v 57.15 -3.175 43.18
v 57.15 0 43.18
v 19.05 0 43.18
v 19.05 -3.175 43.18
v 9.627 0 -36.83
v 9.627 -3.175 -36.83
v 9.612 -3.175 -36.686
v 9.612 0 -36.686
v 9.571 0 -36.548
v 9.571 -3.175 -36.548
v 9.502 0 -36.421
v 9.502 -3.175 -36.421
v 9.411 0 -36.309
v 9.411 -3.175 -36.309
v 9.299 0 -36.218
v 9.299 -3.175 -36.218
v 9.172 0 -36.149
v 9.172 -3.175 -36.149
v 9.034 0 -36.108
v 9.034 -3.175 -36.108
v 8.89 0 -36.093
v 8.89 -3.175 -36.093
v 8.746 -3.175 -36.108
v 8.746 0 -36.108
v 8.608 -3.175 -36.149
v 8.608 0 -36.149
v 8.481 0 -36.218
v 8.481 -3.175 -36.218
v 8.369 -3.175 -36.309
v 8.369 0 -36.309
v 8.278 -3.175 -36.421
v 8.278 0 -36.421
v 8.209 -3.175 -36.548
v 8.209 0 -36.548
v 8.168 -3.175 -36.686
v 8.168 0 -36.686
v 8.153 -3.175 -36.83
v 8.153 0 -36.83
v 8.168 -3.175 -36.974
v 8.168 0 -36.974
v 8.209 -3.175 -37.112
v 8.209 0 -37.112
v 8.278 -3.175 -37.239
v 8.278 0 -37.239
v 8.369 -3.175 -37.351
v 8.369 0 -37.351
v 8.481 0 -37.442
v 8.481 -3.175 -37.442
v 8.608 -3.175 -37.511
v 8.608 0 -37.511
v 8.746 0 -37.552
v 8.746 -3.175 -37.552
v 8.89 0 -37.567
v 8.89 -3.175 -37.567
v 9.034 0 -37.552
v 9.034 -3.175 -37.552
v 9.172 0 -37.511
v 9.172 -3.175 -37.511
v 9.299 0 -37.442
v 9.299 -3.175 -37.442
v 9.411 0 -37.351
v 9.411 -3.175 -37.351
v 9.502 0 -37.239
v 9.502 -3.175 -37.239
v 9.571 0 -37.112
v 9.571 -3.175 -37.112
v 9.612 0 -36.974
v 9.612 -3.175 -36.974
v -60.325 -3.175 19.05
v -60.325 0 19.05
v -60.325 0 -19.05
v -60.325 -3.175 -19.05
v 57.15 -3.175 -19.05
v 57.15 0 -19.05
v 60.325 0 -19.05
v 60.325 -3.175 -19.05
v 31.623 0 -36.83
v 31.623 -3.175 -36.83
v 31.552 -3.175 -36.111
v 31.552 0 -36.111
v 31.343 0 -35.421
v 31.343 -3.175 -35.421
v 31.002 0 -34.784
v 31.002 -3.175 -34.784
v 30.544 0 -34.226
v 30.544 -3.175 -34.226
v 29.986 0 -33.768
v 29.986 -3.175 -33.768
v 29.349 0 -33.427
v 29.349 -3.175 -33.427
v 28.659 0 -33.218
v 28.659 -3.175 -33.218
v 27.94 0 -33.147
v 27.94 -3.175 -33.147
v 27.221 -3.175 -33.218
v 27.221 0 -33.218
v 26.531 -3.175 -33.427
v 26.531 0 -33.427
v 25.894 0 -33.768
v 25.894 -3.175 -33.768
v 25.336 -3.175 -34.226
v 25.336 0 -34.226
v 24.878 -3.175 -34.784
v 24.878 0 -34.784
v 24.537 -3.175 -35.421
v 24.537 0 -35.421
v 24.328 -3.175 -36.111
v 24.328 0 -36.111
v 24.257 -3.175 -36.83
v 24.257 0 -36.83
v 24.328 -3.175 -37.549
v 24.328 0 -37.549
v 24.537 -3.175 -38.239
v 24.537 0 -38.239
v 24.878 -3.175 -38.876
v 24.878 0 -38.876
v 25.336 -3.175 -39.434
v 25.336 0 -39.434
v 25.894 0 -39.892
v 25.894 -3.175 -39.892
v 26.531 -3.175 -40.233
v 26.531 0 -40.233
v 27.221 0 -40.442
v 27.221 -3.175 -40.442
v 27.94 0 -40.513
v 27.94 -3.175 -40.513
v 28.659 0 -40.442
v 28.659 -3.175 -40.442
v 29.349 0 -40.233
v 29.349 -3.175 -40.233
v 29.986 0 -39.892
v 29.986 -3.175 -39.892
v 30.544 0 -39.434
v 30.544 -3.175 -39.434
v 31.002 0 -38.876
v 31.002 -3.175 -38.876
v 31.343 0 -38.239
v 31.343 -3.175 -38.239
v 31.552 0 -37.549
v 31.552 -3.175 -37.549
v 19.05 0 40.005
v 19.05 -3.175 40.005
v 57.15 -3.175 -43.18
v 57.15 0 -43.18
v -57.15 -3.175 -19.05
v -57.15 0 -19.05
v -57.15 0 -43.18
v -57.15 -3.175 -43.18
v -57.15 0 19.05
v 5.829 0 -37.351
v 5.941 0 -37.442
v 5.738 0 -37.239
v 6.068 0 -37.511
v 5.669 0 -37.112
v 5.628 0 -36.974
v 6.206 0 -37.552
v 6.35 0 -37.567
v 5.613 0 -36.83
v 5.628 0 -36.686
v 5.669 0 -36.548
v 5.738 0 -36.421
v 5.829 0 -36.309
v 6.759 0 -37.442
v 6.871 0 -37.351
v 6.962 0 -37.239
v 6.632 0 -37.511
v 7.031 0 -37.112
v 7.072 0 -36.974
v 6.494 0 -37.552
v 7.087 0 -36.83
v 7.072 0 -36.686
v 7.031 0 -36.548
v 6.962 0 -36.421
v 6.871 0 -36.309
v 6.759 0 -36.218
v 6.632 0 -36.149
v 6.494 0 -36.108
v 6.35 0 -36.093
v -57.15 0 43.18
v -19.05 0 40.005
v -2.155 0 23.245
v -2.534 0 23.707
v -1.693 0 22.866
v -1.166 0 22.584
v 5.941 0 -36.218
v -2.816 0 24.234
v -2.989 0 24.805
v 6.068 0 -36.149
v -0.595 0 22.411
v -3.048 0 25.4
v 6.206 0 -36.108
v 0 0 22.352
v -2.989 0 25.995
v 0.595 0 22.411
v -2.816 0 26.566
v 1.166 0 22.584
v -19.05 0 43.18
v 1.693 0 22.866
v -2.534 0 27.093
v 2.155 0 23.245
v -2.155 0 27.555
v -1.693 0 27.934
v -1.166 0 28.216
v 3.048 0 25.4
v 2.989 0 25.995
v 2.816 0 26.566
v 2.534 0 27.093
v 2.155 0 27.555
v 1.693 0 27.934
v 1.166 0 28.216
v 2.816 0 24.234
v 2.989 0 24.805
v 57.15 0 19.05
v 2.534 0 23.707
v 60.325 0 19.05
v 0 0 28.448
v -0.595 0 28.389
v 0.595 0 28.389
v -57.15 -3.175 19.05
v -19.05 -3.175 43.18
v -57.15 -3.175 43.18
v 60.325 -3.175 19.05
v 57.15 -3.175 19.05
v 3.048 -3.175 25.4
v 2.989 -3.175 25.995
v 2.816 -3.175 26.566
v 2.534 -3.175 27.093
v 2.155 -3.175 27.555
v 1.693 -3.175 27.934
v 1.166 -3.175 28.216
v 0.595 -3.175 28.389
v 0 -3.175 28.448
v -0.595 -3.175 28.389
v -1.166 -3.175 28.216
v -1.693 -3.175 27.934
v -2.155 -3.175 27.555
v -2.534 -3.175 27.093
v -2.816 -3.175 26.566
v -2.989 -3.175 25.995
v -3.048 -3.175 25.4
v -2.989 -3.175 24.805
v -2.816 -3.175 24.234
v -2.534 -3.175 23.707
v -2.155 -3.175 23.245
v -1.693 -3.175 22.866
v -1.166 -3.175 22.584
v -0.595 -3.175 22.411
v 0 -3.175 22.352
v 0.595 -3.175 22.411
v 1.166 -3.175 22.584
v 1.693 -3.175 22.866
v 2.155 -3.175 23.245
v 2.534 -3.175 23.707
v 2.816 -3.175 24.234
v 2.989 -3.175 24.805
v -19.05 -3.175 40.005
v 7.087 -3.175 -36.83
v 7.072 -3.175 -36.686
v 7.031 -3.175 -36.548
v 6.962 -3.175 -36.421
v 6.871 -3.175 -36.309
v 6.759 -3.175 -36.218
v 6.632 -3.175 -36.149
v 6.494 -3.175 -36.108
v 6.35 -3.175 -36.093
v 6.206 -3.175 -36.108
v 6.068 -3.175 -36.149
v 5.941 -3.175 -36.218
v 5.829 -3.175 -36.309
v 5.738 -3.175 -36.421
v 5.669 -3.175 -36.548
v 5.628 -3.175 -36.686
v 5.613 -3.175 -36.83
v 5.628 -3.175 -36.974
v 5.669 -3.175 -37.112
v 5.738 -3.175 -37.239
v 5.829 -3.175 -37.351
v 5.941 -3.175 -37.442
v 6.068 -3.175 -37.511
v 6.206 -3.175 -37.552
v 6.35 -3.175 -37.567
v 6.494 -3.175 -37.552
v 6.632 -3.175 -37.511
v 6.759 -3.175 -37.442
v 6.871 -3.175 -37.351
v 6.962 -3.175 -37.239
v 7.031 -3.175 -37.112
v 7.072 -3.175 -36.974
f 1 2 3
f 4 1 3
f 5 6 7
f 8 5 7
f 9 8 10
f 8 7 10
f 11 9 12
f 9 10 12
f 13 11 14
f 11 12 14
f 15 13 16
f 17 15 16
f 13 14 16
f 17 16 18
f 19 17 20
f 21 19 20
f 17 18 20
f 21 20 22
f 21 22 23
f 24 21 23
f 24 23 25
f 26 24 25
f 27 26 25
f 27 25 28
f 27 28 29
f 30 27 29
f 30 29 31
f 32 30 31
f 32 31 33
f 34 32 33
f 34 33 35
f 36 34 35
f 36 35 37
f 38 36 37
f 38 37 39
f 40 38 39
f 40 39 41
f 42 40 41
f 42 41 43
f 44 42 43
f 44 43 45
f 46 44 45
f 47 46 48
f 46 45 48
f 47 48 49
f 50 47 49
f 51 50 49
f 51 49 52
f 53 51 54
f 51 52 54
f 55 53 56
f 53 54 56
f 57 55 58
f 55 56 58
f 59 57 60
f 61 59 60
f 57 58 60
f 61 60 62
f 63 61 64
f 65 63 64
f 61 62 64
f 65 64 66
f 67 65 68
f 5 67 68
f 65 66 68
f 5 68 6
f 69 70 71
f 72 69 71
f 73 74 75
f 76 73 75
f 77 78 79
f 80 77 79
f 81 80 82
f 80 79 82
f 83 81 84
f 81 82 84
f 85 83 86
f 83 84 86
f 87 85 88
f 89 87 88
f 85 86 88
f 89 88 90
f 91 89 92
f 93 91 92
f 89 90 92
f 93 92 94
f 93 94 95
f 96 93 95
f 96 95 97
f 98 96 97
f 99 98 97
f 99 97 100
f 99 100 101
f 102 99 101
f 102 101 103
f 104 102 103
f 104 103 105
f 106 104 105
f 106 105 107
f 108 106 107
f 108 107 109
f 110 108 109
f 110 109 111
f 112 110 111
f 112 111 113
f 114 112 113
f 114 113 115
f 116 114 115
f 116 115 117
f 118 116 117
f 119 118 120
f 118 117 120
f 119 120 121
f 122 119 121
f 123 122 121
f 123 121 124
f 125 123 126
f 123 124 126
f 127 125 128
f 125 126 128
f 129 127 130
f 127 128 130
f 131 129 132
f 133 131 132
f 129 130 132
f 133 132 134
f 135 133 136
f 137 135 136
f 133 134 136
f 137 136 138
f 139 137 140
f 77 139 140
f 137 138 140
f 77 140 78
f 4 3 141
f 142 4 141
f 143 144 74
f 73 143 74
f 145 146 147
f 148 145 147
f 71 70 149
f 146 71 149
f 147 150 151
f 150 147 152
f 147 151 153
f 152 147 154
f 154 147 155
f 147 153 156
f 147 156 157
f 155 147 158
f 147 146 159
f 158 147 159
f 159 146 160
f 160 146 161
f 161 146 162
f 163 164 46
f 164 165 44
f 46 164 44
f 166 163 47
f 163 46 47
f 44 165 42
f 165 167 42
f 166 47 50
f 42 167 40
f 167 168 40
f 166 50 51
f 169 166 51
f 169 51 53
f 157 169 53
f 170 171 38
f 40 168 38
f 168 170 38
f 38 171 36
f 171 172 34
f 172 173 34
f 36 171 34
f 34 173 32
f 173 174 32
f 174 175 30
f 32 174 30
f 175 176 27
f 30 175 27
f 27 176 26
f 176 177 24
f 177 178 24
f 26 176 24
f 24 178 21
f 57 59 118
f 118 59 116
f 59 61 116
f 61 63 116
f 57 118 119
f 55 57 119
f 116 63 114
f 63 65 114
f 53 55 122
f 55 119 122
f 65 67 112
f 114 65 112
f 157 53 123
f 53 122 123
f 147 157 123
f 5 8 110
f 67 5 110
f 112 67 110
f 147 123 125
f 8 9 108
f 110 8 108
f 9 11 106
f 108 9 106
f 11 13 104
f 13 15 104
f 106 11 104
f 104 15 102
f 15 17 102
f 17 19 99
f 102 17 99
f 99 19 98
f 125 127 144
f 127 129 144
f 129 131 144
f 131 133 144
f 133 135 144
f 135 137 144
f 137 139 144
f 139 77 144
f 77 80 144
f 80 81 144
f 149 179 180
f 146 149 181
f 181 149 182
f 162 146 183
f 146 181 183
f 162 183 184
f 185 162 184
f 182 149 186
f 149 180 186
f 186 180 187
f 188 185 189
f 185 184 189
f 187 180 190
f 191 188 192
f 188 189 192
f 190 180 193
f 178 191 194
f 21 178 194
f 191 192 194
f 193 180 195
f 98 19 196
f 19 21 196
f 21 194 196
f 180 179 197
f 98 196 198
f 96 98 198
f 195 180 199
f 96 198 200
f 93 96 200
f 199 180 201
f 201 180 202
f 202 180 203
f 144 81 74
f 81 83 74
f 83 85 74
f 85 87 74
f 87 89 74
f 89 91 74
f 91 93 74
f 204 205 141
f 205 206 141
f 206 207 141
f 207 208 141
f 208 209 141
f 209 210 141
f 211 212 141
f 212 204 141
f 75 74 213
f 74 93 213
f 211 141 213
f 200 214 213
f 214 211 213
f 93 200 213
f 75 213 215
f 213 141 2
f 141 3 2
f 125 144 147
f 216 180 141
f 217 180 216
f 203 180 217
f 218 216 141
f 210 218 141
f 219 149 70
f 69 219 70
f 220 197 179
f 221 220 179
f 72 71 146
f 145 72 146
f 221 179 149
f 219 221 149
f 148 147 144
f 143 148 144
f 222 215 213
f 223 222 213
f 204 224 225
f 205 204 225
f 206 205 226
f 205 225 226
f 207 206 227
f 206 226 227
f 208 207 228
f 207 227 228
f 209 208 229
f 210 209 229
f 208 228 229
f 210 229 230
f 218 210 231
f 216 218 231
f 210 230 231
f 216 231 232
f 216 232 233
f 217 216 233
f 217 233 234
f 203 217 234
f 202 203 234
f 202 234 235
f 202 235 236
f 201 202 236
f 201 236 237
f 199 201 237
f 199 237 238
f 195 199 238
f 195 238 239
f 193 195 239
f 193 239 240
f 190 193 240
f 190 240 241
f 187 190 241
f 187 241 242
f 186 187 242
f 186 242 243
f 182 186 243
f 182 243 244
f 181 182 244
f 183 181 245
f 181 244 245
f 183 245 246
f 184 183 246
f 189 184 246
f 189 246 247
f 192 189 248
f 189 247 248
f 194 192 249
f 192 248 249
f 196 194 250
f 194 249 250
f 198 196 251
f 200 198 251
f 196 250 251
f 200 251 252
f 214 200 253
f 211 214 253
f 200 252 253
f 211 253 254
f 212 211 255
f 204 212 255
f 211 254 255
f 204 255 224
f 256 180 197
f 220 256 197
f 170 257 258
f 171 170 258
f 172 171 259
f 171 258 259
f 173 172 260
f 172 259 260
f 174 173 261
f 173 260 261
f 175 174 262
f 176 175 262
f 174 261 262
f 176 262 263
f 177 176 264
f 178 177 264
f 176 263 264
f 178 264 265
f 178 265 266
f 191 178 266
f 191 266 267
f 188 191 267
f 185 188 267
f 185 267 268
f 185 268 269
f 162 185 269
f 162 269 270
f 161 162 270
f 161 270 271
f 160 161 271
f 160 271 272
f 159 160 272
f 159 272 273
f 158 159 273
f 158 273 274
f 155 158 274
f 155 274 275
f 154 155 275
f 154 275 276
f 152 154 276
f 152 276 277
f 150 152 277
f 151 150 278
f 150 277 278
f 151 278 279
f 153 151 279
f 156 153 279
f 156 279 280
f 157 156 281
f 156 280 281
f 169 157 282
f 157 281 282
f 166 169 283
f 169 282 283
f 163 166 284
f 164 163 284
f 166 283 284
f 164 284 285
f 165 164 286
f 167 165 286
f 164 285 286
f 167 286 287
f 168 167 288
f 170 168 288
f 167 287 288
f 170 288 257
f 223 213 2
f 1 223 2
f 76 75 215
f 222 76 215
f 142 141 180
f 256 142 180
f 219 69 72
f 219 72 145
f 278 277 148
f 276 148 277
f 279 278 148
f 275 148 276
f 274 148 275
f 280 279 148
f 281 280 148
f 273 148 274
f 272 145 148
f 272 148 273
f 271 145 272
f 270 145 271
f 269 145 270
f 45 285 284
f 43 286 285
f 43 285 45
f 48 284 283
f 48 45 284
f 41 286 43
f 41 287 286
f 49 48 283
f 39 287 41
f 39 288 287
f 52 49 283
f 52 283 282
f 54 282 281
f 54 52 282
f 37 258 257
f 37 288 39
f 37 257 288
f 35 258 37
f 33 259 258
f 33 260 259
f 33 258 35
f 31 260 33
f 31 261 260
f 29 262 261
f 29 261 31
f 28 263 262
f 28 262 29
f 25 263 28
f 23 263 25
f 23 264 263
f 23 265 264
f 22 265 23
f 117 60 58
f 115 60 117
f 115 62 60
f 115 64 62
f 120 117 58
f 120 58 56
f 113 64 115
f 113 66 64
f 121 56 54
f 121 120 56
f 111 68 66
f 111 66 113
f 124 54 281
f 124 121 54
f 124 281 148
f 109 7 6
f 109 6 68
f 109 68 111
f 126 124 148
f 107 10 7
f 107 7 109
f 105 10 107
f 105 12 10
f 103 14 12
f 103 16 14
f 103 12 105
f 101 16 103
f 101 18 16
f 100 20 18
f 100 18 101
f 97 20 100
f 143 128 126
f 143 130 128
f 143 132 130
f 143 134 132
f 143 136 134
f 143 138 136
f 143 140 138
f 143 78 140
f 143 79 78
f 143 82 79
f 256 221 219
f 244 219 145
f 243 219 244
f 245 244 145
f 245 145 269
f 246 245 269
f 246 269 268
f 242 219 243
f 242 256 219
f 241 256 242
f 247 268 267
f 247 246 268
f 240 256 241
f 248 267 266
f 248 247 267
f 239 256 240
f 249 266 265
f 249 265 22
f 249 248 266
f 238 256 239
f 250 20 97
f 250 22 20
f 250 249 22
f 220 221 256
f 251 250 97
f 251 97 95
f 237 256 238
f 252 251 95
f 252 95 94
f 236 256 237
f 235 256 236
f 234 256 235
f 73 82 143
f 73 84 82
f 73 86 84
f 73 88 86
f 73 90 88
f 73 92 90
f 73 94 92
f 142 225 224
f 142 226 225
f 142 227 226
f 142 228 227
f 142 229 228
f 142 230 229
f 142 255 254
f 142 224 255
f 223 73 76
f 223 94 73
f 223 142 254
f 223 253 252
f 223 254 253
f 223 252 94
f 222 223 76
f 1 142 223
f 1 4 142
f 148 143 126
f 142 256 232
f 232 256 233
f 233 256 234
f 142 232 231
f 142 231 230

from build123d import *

# Parameters (mm, degrees)
F1_DEPTH = 3.175
F2_R     = 3.048
F2_R_2   = 3.683
F2_R_3   = 0.7366
F3_DEPTH = 3.176


# Not quite as in the source:
# - a feature names something its author has since deleted; it is built from what else it names


with BuildPart() as f1:
    # F0 (on Front) → F1 (new body)
    with BuildSketch(Plane.XZ):
        Polygon((-57.15, -43.18), (57.15, -43.18), (57.15, -19.05), (60.325, -19.05), (60.325, 19.05), (57.15, 19.05), (57.15, 43.18), (19.05, 43.18), (19.05, 40.005), (-19.05, 40.005), (-19.05, 43.18), (-57.15, 43.18), (-57.15, 19.05), (-60.325, 19.05), (-60.325, 0), (-60.325, -19.05), (-57.15, -19.05), align=None)
    extrude(amount=F1_DEPTH)

    # F2 (on face) → F3 (cut, through all)
    with BuildSketch(Plane.XZ.offset(3.175)):
        with Locations((0, 25.4)):
            Circle(F2_R)
        with Locations((27.94, -36.83)):
            Circle(F2_R_2)
        with Locations((6.35, -36.83)):
            Circle(F2_R_3)
        with Locations((8.89, -36.83)):
            Circle(F2_R_3)
    extrude(amount=-F3_DEPTH, mode=Mode.SUBTRACT)


solid = f1.part
